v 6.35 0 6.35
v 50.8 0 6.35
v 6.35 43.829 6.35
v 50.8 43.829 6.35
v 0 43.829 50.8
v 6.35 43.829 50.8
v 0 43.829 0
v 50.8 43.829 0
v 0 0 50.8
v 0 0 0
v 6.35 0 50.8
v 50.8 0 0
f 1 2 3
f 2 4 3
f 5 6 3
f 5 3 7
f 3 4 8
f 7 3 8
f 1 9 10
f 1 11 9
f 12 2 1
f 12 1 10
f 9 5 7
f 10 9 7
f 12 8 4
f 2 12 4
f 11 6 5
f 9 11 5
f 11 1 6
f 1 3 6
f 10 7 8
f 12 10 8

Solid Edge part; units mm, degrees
sketch "Sketch1" plane through (0, 0, 0) normal (1, 0, 0) x (0, 1, 0)
  line L0 (0, 0) -> (43.8289, 0)
sketch "Sketch2" plane through (0, 0, 0) normal (0, -1, 0) x (1, 0, 0)
  line L0 (0, 50.8) -> (0, 0)
  line L1 (0, 0) -> (50.8, 0)
  line L2 (50.8, 0) -> (50.8, 6.35)
  line L3 (50.8, 6.35) -> (6.35, 6.35)
  line L4 (6.35, 6.35) -> (6.35, 50.8)
  line L5 (6.35, 50.8) -> (0, 50.8)
  dimension "D1" = 50.8
  dimension "D2" = 50.8
  dimension "D3" = 6.35
sweep "SweptProtrusion_1" add profiles "Sketch2" path "Sketch1"
